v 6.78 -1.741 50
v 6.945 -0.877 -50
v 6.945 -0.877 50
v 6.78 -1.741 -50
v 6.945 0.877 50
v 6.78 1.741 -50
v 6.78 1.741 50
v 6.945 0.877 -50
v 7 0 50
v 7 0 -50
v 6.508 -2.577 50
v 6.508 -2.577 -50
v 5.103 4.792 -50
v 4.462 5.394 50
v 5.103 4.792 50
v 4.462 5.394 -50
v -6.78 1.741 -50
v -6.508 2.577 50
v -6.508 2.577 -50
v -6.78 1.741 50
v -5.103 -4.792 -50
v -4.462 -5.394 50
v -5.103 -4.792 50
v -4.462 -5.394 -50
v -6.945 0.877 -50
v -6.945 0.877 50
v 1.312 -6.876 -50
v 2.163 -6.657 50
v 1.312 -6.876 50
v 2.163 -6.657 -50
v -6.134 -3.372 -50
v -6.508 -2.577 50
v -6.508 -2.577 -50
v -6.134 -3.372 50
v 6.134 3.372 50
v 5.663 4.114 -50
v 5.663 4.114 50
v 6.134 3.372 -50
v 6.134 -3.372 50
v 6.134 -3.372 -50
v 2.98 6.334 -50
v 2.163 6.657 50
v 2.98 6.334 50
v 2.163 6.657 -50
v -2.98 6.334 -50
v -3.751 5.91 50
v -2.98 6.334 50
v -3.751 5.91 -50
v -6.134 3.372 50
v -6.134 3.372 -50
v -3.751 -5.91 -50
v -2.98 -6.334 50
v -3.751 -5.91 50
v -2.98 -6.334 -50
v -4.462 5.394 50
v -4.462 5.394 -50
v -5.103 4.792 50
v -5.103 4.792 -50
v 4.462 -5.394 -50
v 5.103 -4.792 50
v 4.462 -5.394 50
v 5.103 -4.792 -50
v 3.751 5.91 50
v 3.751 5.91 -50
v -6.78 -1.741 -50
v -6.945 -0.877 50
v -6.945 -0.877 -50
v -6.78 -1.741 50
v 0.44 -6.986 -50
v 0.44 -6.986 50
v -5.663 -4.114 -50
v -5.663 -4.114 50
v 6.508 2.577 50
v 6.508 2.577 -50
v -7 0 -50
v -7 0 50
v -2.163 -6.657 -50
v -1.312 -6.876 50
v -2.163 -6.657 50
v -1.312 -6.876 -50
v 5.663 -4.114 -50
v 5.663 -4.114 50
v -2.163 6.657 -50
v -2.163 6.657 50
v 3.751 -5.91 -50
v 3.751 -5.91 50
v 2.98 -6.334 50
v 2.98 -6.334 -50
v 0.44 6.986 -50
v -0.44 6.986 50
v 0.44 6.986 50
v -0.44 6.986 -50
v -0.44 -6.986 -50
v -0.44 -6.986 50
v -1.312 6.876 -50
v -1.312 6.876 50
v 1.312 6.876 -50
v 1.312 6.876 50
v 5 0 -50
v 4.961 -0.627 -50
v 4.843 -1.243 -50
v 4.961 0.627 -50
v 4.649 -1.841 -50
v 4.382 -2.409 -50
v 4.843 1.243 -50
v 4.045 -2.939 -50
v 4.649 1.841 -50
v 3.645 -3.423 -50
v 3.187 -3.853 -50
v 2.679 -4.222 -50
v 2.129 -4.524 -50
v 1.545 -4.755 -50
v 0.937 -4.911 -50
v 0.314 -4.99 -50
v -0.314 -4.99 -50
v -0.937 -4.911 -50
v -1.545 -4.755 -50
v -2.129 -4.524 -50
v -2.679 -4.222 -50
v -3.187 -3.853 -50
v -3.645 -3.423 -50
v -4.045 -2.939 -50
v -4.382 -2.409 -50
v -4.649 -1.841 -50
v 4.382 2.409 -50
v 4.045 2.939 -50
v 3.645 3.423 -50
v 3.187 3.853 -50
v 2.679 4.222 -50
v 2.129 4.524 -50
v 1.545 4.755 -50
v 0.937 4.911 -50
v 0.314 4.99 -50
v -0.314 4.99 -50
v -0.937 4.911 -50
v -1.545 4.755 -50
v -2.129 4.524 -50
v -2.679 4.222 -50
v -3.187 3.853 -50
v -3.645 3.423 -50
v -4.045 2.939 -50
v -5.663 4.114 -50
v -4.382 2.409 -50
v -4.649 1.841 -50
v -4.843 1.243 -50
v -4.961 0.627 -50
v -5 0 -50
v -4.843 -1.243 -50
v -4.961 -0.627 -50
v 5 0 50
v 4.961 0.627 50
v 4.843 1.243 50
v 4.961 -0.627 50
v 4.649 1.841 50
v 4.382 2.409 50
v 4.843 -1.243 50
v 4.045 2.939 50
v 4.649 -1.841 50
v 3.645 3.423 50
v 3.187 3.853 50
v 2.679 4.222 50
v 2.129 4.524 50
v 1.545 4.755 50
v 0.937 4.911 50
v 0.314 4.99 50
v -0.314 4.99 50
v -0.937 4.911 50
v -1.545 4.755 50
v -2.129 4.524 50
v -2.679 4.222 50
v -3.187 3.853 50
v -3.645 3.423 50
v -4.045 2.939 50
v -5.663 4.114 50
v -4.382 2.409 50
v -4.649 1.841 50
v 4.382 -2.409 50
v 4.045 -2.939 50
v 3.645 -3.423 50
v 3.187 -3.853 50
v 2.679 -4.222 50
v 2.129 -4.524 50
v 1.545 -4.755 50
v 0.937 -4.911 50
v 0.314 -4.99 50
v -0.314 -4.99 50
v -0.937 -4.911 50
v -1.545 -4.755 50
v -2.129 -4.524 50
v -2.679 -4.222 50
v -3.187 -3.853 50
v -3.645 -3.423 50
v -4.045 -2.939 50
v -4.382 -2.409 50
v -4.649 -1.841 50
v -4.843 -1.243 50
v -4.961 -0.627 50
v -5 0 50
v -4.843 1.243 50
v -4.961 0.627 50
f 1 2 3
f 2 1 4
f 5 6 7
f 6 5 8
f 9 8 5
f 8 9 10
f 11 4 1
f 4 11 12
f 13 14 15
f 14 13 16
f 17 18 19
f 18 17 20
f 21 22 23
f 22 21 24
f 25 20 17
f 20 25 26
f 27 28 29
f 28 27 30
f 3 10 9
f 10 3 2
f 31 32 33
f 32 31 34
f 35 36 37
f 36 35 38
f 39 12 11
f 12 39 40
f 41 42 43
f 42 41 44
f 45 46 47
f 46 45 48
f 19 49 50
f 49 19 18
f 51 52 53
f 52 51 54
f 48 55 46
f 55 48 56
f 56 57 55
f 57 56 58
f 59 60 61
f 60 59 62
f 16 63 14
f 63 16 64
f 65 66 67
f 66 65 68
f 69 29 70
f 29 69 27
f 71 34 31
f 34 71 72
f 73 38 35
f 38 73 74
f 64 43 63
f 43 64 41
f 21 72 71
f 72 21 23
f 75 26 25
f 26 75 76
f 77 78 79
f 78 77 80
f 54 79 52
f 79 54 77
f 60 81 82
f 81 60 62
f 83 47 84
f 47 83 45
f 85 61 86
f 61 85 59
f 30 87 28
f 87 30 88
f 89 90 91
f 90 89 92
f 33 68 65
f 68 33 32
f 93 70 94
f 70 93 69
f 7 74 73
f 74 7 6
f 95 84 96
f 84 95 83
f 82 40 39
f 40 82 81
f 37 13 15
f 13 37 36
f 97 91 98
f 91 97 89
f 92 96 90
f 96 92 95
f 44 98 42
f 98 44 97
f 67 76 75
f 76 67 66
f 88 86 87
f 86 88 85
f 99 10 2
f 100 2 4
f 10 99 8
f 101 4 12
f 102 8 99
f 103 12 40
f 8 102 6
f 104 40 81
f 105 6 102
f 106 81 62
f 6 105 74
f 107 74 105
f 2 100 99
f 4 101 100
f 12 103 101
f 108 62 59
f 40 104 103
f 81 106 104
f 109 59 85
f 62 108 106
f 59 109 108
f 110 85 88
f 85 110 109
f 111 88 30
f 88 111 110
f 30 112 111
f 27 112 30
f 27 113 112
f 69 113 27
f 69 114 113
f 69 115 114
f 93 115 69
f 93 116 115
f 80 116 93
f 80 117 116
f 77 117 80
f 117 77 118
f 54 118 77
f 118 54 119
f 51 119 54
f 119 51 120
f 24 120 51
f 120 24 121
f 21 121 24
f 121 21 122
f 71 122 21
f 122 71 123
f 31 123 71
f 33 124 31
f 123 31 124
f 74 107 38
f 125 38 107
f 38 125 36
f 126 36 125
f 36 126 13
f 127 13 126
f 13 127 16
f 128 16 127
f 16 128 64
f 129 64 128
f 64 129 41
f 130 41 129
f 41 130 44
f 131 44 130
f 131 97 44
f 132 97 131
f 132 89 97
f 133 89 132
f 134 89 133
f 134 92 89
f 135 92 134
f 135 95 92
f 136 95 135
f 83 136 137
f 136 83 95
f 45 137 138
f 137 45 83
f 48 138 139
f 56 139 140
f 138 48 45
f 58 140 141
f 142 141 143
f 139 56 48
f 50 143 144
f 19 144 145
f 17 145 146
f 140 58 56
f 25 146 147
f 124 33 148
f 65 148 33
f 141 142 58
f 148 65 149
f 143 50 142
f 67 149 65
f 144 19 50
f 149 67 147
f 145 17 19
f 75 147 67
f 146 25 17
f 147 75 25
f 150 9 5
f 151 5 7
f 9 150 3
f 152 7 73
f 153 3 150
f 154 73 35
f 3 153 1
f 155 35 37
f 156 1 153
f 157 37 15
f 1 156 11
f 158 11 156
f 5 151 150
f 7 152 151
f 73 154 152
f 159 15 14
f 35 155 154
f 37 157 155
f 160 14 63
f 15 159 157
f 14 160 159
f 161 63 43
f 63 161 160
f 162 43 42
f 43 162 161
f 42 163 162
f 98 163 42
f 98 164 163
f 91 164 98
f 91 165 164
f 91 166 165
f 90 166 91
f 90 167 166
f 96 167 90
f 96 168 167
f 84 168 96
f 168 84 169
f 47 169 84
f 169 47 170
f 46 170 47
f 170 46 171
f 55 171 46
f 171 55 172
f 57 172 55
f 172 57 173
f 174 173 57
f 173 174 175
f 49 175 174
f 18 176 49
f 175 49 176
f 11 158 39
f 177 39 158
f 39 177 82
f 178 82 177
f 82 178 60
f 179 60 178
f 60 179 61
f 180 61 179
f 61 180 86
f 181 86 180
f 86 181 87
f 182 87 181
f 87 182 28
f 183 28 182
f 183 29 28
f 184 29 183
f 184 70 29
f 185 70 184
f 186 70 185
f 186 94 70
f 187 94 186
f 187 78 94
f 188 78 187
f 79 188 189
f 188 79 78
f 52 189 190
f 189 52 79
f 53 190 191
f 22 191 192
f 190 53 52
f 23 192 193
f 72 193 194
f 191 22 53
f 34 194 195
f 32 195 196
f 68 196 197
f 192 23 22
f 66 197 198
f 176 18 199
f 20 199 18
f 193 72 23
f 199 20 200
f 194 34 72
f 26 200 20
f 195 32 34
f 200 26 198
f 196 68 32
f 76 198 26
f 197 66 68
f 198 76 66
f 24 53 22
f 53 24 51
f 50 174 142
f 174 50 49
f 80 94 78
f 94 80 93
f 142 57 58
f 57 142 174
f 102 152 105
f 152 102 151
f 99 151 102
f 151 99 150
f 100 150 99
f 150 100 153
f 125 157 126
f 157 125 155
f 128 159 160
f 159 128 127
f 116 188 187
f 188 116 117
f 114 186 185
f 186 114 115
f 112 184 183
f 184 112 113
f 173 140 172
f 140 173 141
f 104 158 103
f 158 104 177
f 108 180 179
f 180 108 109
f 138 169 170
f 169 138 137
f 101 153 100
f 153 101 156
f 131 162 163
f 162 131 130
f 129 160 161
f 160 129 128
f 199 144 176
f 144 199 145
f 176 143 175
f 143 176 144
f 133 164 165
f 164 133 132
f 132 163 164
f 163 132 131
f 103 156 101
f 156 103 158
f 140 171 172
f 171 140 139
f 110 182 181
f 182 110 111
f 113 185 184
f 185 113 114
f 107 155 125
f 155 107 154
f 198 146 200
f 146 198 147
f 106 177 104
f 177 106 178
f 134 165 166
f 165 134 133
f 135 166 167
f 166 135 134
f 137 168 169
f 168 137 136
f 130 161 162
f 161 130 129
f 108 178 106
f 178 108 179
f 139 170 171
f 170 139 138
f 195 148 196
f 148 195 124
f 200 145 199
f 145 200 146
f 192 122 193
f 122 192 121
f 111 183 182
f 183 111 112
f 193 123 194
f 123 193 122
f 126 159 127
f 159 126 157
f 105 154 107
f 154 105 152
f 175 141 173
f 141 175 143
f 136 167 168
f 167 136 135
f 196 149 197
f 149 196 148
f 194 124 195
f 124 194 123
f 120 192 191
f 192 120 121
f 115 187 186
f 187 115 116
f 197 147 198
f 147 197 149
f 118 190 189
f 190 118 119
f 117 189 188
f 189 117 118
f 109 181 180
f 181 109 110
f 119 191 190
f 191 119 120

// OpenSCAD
$fn = 50;


difference() {
	union() {
		translate(v = [0, 0, -50.0000000000]) {
			cylinder(h = 100, r = 7.0000000000);
		}
	}
	union() {
		translate(v = [0, 0, -100.0000000000]) {
			cylinder(h = 200, r = 5.0000000000);
		}
	}
}
